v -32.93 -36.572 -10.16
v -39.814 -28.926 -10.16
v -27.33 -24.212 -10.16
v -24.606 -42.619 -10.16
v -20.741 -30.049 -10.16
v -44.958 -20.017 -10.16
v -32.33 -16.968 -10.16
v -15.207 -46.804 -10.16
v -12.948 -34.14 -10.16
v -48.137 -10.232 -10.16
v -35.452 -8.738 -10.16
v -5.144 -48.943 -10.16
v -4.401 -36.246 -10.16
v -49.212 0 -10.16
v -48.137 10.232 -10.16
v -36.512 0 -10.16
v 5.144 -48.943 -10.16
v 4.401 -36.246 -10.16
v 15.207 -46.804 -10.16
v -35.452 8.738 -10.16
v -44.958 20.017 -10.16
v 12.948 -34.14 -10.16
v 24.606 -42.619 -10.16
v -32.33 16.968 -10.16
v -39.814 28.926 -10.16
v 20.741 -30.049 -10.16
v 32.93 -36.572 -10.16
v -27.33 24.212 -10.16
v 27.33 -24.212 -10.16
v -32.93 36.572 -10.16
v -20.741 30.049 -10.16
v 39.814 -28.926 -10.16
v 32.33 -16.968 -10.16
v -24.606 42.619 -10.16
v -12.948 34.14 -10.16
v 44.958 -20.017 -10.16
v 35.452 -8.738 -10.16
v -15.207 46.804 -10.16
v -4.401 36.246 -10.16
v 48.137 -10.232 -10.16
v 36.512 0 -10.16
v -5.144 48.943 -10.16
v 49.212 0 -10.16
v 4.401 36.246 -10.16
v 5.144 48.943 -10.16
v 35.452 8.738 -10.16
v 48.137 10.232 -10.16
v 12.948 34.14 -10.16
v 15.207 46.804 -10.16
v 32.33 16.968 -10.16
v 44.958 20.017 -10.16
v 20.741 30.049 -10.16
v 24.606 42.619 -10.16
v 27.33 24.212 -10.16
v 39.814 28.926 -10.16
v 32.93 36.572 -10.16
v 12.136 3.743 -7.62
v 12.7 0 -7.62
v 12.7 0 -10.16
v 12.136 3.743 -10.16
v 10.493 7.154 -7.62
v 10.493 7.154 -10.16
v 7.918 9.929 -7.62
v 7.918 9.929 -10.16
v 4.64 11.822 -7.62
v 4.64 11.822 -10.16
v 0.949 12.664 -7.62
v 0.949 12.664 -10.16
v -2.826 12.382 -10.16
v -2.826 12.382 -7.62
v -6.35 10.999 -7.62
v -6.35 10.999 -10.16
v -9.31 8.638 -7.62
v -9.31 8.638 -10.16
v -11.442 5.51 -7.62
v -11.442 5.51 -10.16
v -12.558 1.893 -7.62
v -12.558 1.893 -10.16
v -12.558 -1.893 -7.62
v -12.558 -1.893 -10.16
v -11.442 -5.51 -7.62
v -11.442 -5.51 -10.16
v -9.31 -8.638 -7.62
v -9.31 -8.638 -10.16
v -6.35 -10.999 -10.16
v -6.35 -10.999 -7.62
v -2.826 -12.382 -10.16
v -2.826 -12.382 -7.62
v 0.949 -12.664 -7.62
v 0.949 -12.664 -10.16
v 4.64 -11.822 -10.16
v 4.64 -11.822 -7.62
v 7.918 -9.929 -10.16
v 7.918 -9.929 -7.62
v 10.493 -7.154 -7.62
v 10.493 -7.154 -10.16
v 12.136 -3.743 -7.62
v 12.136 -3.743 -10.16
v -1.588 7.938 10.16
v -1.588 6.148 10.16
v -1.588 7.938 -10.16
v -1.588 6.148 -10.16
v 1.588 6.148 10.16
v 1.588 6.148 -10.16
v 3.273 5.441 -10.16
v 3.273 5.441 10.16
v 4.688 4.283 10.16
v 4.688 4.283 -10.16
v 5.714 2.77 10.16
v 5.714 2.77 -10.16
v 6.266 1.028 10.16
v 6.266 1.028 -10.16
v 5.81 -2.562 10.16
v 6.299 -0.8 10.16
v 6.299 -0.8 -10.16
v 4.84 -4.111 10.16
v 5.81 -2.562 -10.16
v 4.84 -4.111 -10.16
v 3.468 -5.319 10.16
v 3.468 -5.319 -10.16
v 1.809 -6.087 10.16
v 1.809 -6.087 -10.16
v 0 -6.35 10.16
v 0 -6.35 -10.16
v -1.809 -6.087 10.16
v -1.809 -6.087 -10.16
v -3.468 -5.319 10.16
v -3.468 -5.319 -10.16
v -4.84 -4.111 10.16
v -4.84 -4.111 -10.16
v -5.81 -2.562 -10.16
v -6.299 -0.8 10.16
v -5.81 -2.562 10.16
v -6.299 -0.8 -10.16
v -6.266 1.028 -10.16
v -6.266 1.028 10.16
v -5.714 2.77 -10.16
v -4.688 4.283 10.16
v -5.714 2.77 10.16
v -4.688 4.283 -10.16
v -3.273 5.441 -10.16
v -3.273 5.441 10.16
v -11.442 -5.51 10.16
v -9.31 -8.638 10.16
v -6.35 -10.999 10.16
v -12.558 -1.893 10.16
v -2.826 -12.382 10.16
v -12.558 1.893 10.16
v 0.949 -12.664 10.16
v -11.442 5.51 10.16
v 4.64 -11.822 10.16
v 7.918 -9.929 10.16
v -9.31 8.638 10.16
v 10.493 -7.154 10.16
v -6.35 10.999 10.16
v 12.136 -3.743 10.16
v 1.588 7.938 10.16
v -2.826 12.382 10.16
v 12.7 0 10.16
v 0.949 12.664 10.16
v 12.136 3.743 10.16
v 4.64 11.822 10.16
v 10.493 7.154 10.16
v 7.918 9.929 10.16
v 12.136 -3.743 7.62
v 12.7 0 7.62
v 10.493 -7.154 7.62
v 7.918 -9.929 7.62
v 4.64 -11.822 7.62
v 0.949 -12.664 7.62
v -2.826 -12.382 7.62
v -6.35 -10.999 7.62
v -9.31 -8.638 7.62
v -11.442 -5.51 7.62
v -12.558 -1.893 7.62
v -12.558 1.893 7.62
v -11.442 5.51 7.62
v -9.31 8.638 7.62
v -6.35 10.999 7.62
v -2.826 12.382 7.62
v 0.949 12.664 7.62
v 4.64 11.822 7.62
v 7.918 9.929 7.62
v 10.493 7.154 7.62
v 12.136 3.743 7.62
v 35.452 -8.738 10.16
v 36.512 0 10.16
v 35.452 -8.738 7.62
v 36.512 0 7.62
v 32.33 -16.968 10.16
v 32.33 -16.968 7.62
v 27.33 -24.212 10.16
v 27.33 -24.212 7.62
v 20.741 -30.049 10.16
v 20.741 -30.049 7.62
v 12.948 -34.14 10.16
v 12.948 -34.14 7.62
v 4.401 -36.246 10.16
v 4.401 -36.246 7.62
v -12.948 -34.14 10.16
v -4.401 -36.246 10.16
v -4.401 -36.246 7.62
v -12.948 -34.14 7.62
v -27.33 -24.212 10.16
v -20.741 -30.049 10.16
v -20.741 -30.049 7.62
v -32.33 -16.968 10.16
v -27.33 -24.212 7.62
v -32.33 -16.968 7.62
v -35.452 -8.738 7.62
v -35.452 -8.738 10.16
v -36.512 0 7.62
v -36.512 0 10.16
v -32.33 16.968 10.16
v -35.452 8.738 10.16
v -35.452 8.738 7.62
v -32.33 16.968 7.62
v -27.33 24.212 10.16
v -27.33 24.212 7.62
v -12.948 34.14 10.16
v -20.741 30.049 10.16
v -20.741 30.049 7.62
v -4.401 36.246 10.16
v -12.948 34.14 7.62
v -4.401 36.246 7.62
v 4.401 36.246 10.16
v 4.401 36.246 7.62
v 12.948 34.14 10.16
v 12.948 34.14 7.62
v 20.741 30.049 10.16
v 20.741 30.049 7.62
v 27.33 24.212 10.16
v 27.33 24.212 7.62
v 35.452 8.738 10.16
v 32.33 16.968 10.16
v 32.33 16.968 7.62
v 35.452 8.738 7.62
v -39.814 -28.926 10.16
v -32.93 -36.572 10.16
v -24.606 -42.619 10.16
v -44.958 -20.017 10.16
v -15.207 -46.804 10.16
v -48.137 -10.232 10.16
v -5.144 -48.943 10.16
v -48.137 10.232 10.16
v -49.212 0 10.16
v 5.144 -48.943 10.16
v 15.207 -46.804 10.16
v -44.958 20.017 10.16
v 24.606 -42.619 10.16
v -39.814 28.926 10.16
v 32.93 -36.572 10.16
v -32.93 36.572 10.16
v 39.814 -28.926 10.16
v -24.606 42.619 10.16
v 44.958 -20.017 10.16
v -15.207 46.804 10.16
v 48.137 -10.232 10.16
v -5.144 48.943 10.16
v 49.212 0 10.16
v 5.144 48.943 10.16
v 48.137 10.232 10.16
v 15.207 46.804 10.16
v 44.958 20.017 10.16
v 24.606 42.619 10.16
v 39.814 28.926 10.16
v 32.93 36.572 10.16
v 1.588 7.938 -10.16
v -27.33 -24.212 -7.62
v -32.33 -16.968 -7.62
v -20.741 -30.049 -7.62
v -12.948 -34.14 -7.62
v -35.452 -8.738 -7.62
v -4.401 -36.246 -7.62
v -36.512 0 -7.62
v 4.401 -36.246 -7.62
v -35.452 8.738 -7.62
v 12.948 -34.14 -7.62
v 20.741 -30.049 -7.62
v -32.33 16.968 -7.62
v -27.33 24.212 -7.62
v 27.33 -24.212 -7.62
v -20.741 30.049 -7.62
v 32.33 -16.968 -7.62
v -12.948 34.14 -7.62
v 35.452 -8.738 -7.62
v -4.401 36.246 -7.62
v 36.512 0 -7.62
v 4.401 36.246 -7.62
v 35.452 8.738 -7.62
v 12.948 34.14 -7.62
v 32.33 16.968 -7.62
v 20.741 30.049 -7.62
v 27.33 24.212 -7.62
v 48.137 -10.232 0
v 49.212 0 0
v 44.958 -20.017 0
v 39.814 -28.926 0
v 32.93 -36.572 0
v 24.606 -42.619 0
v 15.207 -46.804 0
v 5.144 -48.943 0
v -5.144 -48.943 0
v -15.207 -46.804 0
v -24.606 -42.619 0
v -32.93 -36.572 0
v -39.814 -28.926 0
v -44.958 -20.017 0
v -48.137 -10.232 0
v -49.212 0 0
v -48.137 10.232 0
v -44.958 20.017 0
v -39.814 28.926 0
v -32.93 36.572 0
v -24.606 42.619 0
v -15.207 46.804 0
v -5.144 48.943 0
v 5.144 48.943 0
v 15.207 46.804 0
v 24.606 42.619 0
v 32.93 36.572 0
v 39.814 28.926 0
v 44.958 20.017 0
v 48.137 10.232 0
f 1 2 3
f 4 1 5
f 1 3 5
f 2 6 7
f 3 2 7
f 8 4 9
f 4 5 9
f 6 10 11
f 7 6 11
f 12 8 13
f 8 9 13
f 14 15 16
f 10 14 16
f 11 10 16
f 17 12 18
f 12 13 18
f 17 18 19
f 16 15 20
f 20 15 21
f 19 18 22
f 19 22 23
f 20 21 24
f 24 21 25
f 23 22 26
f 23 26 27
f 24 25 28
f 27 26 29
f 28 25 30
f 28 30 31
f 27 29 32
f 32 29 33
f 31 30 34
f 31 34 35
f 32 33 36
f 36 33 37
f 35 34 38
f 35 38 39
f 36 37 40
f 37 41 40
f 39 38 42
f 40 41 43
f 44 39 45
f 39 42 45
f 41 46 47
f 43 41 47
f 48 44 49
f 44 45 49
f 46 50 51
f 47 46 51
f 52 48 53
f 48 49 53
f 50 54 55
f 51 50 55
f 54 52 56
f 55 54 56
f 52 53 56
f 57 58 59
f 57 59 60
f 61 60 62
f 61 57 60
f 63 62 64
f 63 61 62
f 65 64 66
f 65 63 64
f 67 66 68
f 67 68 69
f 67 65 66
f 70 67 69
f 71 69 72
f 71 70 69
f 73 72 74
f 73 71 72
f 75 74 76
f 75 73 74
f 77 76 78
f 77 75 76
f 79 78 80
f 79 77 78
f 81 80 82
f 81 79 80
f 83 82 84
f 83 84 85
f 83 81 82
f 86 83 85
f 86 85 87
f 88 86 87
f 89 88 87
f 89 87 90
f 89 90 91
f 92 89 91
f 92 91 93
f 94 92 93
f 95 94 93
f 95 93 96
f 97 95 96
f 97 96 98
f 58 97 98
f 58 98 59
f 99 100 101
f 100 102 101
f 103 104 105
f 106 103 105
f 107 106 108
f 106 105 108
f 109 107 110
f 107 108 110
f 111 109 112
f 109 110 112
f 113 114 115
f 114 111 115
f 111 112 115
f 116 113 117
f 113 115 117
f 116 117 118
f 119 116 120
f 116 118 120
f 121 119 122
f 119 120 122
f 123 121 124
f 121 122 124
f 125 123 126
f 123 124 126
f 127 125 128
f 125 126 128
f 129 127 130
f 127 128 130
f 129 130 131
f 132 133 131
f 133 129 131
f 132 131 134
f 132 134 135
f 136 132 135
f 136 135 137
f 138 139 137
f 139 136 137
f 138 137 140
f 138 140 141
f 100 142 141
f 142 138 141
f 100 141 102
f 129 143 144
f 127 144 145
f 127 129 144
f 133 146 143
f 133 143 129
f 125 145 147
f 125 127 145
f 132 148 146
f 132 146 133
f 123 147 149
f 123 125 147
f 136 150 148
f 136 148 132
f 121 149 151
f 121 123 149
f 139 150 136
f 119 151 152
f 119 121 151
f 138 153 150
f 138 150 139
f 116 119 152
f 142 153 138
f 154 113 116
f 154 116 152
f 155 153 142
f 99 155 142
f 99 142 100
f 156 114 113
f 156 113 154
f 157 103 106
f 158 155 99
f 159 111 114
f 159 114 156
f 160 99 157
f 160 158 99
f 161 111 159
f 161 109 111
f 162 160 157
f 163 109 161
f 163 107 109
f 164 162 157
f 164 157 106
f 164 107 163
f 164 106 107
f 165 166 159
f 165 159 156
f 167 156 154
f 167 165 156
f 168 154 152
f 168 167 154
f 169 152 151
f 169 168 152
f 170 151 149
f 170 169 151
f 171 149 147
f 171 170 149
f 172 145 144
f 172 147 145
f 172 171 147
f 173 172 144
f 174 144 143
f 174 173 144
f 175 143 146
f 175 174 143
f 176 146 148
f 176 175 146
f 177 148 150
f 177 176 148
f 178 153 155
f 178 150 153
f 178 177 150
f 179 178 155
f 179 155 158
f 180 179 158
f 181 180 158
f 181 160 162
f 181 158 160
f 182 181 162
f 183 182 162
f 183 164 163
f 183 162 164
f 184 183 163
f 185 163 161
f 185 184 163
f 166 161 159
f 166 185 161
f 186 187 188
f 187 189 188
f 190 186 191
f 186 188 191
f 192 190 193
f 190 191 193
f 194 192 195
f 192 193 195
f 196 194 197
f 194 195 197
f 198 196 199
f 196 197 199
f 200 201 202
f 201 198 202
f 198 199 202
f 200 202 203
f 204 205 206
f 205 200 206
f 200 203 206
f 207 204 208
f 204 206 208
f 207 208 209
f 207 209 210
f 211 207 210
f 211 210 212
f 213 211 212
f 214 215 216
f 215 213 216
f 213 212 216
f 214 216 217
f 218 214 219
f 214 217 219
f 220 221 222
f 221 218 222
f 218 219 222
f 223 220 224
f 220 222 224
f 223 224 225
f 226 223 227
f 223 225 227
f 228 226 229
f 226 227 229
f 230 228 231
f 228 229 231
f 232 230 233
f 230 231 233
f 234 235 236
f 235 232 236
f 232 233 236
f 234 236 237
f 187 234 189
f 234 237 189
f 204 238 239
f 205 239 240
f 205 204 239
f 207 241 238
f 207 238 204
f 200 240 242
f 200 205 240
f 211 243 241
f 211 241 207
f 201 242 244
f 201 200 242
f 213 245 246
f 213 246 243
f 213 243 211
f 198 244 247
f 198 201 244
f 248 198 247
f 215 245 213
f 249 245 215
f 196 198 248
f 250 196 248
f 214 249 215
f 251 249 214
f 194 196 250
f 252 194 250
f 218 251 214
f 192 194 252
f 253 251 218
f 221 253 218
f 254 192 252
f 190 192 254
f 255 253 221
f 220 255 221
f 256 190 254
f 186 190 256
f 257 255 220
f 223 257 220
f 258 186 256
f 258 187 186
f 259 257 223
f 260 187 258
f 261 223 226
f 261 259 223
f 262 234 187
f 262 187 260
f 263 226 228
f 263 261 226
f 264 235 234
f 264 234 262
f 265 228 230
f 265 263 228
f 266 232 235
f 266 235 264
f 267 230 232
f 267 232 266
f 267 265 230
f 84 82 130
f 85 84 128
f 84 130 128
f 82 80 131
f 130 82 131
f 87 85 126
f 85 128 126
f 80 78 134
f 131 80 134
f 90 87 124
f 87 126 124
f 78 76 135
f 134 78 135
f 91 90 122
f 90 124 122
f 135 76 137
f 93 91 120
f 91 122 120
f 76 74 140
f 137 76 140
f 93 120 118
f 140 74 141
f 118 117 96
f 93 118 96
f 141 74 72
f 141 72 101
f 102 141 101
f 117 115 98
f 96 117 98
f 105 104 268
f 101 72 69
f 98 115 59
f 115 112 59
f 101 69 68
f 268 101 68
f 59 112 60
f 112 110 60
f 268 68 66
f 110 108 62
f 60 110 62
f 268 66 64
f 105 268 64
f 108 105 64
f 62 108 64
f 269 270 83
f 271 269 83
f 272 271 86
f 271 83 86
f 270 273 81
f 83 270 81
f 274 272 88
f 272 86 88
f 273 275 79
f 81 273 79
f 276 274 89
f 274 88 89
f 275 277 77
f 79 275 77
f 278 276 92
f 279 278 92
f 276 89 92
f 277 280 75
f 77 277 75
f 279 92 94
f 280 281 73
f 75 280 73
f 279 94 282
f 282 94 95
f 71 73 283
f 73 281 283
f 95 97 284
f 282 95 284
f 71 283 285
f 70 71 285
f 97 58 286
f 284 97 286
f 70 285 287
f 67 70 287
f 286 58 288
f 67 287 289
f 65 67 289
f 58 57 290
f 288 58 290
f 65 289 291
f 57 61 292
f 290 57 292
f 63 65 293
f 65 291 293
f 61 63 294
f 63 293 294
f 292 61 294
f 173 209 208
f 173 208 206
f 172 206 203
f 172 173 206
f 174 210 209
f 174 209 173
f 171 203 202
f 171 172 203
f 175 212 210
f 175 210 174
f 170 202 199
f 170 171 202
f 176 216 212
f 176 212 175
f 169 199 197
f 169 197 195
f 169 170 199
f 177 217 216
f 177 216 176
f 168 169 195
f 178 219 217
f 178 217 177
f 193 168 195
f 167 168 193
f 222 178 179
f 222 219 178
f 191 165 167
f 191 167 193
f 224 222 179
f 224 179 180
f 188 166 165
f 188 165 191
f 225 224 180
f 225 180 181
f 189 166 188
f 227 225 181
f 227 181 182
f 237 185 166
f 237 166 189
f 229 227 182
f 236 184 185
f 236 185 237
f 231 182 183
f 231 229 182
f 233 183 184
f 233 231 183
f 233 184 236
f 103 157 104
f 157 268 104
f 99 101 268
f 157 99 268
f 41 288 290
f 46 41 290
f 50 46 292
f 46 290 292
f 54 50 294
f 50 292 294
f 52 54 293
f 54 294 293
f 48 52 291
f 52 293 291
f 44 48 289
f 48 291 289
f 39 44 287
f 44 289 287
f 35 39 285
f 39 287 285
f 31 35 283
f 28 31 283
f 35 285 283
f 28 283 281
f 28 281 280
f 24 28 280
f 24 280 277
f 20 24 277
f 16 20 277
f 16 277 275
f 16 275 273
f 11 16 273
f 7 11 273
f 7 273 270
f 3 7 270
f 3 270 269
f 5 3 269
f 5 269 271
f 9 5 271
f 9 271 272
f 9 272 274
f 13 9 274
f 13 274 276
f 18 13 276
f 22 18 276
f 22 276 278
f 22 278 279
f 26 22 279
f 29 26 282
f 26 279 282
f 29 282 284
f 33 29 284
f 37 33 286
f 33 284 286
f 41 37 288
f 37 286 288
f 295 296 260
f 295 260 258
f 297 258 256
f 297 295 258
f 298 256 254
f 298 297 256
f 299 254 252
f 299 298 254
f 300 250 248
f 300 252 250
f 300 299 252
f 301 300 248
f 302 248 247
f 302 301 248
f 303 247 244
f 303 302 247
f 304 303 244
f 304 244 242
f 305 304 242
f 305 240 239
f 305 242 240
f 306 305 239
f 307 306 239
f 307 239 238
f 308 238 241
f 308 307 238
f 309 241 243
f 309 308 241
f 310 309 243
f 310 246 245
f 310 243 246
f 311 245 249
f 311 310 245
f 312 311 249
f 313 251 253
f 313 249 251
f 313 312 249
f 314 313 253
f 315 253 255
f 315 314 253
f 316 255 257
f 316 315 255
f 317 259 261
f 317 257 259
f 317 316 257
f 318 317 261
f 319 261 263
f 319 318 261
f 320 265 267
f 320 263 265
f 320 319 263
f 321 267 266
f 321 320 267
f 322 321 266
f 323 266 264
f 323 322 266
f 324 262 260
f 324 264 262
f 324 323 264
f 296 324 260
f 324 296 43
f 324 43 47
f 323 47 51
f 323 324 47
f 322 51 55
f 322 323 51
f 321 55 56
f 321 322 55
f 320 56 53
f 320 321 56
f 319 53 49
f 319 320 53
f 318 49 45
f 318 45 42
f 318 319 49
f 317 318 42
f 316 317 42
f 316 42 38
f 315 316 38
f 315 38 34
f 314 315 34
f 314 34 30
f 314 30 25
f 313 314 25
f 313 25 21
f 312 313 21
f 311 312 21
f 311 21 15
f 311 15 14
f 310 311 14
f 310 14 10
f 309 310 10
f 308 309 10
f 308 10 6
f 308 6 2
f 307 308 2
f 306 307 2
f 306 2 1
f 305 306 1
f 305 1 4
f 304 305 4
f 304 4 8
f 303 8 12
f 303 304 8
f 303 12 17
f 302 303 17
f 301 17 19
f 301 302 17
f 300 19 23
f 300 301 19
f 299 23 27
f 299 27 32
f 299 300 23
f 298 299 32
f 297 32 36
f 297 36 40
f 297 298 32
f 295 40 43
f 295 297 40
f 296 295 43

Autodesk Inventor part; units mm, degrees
ref_plane "YZ Plane" through (0, 0, 0) normal (1, 0, 0) x (0, 1, 0)
ref_plane "XZ Plane" through (0, 0, 0) normal (0, 1, 0) x (-1, 0, 0)
ref_plane "XY Plane" through (0, 0, 0) normal (0, 0, 1) x (1, 0, 0)
sketch "Sketch1" plane through (0, 0, 0) normal (0, 0, 1) x (1, 0, 0)
  circle A0 centre (0, 0) radius 49.2125
  circle A1 centre (0, 0) radius 6.35
  circle A2 centre (0, 0) radius 36.5125
  circle A3 centre (0, 0) radius 12.7
  line L0 (-1.5875, 7.9375) -> (1.5875, 7.9375)
  line L1 (1.5875, 7.9375) -> (1.5875, 6.1484)
  line L2 (1.5875, 6.1484) -> (-1.5875, 6.1484)
  line L3 (-1.5875, 6.1484) -> (-1.5875, 7.9375)
  point P0 (0, 6.1484)
  dimension "d1" = 12.7
  dimension "d0" = 98.425
  dimension "d2" = 12.7
  dimension "d3" = 25.4
  dimension "d10" = 7.9375
  dimension "d11" = 3.175
extrude "Extrusion1" add sketch "Sketch1" along normal mid plane 20.32 contours A0
extrude "Extrusion2" add sketch "Sketch1" along normal mid plane 15.24 contours A2
extrude "Extrusion3" add sketch "Sketch1" along normal mid plane 20.32 contours L2 A1 | A1 L3 L0 L1 | A3 picked at (-0.1781, 6.2081)
extrude "Extrusion4" cut sketch "Sketch1" along normal mid plane 25.4 contours L2 A1 | A1 L3 L0 L1 picked at (-0.1781, 6.2081)
properties part number "wheel"
